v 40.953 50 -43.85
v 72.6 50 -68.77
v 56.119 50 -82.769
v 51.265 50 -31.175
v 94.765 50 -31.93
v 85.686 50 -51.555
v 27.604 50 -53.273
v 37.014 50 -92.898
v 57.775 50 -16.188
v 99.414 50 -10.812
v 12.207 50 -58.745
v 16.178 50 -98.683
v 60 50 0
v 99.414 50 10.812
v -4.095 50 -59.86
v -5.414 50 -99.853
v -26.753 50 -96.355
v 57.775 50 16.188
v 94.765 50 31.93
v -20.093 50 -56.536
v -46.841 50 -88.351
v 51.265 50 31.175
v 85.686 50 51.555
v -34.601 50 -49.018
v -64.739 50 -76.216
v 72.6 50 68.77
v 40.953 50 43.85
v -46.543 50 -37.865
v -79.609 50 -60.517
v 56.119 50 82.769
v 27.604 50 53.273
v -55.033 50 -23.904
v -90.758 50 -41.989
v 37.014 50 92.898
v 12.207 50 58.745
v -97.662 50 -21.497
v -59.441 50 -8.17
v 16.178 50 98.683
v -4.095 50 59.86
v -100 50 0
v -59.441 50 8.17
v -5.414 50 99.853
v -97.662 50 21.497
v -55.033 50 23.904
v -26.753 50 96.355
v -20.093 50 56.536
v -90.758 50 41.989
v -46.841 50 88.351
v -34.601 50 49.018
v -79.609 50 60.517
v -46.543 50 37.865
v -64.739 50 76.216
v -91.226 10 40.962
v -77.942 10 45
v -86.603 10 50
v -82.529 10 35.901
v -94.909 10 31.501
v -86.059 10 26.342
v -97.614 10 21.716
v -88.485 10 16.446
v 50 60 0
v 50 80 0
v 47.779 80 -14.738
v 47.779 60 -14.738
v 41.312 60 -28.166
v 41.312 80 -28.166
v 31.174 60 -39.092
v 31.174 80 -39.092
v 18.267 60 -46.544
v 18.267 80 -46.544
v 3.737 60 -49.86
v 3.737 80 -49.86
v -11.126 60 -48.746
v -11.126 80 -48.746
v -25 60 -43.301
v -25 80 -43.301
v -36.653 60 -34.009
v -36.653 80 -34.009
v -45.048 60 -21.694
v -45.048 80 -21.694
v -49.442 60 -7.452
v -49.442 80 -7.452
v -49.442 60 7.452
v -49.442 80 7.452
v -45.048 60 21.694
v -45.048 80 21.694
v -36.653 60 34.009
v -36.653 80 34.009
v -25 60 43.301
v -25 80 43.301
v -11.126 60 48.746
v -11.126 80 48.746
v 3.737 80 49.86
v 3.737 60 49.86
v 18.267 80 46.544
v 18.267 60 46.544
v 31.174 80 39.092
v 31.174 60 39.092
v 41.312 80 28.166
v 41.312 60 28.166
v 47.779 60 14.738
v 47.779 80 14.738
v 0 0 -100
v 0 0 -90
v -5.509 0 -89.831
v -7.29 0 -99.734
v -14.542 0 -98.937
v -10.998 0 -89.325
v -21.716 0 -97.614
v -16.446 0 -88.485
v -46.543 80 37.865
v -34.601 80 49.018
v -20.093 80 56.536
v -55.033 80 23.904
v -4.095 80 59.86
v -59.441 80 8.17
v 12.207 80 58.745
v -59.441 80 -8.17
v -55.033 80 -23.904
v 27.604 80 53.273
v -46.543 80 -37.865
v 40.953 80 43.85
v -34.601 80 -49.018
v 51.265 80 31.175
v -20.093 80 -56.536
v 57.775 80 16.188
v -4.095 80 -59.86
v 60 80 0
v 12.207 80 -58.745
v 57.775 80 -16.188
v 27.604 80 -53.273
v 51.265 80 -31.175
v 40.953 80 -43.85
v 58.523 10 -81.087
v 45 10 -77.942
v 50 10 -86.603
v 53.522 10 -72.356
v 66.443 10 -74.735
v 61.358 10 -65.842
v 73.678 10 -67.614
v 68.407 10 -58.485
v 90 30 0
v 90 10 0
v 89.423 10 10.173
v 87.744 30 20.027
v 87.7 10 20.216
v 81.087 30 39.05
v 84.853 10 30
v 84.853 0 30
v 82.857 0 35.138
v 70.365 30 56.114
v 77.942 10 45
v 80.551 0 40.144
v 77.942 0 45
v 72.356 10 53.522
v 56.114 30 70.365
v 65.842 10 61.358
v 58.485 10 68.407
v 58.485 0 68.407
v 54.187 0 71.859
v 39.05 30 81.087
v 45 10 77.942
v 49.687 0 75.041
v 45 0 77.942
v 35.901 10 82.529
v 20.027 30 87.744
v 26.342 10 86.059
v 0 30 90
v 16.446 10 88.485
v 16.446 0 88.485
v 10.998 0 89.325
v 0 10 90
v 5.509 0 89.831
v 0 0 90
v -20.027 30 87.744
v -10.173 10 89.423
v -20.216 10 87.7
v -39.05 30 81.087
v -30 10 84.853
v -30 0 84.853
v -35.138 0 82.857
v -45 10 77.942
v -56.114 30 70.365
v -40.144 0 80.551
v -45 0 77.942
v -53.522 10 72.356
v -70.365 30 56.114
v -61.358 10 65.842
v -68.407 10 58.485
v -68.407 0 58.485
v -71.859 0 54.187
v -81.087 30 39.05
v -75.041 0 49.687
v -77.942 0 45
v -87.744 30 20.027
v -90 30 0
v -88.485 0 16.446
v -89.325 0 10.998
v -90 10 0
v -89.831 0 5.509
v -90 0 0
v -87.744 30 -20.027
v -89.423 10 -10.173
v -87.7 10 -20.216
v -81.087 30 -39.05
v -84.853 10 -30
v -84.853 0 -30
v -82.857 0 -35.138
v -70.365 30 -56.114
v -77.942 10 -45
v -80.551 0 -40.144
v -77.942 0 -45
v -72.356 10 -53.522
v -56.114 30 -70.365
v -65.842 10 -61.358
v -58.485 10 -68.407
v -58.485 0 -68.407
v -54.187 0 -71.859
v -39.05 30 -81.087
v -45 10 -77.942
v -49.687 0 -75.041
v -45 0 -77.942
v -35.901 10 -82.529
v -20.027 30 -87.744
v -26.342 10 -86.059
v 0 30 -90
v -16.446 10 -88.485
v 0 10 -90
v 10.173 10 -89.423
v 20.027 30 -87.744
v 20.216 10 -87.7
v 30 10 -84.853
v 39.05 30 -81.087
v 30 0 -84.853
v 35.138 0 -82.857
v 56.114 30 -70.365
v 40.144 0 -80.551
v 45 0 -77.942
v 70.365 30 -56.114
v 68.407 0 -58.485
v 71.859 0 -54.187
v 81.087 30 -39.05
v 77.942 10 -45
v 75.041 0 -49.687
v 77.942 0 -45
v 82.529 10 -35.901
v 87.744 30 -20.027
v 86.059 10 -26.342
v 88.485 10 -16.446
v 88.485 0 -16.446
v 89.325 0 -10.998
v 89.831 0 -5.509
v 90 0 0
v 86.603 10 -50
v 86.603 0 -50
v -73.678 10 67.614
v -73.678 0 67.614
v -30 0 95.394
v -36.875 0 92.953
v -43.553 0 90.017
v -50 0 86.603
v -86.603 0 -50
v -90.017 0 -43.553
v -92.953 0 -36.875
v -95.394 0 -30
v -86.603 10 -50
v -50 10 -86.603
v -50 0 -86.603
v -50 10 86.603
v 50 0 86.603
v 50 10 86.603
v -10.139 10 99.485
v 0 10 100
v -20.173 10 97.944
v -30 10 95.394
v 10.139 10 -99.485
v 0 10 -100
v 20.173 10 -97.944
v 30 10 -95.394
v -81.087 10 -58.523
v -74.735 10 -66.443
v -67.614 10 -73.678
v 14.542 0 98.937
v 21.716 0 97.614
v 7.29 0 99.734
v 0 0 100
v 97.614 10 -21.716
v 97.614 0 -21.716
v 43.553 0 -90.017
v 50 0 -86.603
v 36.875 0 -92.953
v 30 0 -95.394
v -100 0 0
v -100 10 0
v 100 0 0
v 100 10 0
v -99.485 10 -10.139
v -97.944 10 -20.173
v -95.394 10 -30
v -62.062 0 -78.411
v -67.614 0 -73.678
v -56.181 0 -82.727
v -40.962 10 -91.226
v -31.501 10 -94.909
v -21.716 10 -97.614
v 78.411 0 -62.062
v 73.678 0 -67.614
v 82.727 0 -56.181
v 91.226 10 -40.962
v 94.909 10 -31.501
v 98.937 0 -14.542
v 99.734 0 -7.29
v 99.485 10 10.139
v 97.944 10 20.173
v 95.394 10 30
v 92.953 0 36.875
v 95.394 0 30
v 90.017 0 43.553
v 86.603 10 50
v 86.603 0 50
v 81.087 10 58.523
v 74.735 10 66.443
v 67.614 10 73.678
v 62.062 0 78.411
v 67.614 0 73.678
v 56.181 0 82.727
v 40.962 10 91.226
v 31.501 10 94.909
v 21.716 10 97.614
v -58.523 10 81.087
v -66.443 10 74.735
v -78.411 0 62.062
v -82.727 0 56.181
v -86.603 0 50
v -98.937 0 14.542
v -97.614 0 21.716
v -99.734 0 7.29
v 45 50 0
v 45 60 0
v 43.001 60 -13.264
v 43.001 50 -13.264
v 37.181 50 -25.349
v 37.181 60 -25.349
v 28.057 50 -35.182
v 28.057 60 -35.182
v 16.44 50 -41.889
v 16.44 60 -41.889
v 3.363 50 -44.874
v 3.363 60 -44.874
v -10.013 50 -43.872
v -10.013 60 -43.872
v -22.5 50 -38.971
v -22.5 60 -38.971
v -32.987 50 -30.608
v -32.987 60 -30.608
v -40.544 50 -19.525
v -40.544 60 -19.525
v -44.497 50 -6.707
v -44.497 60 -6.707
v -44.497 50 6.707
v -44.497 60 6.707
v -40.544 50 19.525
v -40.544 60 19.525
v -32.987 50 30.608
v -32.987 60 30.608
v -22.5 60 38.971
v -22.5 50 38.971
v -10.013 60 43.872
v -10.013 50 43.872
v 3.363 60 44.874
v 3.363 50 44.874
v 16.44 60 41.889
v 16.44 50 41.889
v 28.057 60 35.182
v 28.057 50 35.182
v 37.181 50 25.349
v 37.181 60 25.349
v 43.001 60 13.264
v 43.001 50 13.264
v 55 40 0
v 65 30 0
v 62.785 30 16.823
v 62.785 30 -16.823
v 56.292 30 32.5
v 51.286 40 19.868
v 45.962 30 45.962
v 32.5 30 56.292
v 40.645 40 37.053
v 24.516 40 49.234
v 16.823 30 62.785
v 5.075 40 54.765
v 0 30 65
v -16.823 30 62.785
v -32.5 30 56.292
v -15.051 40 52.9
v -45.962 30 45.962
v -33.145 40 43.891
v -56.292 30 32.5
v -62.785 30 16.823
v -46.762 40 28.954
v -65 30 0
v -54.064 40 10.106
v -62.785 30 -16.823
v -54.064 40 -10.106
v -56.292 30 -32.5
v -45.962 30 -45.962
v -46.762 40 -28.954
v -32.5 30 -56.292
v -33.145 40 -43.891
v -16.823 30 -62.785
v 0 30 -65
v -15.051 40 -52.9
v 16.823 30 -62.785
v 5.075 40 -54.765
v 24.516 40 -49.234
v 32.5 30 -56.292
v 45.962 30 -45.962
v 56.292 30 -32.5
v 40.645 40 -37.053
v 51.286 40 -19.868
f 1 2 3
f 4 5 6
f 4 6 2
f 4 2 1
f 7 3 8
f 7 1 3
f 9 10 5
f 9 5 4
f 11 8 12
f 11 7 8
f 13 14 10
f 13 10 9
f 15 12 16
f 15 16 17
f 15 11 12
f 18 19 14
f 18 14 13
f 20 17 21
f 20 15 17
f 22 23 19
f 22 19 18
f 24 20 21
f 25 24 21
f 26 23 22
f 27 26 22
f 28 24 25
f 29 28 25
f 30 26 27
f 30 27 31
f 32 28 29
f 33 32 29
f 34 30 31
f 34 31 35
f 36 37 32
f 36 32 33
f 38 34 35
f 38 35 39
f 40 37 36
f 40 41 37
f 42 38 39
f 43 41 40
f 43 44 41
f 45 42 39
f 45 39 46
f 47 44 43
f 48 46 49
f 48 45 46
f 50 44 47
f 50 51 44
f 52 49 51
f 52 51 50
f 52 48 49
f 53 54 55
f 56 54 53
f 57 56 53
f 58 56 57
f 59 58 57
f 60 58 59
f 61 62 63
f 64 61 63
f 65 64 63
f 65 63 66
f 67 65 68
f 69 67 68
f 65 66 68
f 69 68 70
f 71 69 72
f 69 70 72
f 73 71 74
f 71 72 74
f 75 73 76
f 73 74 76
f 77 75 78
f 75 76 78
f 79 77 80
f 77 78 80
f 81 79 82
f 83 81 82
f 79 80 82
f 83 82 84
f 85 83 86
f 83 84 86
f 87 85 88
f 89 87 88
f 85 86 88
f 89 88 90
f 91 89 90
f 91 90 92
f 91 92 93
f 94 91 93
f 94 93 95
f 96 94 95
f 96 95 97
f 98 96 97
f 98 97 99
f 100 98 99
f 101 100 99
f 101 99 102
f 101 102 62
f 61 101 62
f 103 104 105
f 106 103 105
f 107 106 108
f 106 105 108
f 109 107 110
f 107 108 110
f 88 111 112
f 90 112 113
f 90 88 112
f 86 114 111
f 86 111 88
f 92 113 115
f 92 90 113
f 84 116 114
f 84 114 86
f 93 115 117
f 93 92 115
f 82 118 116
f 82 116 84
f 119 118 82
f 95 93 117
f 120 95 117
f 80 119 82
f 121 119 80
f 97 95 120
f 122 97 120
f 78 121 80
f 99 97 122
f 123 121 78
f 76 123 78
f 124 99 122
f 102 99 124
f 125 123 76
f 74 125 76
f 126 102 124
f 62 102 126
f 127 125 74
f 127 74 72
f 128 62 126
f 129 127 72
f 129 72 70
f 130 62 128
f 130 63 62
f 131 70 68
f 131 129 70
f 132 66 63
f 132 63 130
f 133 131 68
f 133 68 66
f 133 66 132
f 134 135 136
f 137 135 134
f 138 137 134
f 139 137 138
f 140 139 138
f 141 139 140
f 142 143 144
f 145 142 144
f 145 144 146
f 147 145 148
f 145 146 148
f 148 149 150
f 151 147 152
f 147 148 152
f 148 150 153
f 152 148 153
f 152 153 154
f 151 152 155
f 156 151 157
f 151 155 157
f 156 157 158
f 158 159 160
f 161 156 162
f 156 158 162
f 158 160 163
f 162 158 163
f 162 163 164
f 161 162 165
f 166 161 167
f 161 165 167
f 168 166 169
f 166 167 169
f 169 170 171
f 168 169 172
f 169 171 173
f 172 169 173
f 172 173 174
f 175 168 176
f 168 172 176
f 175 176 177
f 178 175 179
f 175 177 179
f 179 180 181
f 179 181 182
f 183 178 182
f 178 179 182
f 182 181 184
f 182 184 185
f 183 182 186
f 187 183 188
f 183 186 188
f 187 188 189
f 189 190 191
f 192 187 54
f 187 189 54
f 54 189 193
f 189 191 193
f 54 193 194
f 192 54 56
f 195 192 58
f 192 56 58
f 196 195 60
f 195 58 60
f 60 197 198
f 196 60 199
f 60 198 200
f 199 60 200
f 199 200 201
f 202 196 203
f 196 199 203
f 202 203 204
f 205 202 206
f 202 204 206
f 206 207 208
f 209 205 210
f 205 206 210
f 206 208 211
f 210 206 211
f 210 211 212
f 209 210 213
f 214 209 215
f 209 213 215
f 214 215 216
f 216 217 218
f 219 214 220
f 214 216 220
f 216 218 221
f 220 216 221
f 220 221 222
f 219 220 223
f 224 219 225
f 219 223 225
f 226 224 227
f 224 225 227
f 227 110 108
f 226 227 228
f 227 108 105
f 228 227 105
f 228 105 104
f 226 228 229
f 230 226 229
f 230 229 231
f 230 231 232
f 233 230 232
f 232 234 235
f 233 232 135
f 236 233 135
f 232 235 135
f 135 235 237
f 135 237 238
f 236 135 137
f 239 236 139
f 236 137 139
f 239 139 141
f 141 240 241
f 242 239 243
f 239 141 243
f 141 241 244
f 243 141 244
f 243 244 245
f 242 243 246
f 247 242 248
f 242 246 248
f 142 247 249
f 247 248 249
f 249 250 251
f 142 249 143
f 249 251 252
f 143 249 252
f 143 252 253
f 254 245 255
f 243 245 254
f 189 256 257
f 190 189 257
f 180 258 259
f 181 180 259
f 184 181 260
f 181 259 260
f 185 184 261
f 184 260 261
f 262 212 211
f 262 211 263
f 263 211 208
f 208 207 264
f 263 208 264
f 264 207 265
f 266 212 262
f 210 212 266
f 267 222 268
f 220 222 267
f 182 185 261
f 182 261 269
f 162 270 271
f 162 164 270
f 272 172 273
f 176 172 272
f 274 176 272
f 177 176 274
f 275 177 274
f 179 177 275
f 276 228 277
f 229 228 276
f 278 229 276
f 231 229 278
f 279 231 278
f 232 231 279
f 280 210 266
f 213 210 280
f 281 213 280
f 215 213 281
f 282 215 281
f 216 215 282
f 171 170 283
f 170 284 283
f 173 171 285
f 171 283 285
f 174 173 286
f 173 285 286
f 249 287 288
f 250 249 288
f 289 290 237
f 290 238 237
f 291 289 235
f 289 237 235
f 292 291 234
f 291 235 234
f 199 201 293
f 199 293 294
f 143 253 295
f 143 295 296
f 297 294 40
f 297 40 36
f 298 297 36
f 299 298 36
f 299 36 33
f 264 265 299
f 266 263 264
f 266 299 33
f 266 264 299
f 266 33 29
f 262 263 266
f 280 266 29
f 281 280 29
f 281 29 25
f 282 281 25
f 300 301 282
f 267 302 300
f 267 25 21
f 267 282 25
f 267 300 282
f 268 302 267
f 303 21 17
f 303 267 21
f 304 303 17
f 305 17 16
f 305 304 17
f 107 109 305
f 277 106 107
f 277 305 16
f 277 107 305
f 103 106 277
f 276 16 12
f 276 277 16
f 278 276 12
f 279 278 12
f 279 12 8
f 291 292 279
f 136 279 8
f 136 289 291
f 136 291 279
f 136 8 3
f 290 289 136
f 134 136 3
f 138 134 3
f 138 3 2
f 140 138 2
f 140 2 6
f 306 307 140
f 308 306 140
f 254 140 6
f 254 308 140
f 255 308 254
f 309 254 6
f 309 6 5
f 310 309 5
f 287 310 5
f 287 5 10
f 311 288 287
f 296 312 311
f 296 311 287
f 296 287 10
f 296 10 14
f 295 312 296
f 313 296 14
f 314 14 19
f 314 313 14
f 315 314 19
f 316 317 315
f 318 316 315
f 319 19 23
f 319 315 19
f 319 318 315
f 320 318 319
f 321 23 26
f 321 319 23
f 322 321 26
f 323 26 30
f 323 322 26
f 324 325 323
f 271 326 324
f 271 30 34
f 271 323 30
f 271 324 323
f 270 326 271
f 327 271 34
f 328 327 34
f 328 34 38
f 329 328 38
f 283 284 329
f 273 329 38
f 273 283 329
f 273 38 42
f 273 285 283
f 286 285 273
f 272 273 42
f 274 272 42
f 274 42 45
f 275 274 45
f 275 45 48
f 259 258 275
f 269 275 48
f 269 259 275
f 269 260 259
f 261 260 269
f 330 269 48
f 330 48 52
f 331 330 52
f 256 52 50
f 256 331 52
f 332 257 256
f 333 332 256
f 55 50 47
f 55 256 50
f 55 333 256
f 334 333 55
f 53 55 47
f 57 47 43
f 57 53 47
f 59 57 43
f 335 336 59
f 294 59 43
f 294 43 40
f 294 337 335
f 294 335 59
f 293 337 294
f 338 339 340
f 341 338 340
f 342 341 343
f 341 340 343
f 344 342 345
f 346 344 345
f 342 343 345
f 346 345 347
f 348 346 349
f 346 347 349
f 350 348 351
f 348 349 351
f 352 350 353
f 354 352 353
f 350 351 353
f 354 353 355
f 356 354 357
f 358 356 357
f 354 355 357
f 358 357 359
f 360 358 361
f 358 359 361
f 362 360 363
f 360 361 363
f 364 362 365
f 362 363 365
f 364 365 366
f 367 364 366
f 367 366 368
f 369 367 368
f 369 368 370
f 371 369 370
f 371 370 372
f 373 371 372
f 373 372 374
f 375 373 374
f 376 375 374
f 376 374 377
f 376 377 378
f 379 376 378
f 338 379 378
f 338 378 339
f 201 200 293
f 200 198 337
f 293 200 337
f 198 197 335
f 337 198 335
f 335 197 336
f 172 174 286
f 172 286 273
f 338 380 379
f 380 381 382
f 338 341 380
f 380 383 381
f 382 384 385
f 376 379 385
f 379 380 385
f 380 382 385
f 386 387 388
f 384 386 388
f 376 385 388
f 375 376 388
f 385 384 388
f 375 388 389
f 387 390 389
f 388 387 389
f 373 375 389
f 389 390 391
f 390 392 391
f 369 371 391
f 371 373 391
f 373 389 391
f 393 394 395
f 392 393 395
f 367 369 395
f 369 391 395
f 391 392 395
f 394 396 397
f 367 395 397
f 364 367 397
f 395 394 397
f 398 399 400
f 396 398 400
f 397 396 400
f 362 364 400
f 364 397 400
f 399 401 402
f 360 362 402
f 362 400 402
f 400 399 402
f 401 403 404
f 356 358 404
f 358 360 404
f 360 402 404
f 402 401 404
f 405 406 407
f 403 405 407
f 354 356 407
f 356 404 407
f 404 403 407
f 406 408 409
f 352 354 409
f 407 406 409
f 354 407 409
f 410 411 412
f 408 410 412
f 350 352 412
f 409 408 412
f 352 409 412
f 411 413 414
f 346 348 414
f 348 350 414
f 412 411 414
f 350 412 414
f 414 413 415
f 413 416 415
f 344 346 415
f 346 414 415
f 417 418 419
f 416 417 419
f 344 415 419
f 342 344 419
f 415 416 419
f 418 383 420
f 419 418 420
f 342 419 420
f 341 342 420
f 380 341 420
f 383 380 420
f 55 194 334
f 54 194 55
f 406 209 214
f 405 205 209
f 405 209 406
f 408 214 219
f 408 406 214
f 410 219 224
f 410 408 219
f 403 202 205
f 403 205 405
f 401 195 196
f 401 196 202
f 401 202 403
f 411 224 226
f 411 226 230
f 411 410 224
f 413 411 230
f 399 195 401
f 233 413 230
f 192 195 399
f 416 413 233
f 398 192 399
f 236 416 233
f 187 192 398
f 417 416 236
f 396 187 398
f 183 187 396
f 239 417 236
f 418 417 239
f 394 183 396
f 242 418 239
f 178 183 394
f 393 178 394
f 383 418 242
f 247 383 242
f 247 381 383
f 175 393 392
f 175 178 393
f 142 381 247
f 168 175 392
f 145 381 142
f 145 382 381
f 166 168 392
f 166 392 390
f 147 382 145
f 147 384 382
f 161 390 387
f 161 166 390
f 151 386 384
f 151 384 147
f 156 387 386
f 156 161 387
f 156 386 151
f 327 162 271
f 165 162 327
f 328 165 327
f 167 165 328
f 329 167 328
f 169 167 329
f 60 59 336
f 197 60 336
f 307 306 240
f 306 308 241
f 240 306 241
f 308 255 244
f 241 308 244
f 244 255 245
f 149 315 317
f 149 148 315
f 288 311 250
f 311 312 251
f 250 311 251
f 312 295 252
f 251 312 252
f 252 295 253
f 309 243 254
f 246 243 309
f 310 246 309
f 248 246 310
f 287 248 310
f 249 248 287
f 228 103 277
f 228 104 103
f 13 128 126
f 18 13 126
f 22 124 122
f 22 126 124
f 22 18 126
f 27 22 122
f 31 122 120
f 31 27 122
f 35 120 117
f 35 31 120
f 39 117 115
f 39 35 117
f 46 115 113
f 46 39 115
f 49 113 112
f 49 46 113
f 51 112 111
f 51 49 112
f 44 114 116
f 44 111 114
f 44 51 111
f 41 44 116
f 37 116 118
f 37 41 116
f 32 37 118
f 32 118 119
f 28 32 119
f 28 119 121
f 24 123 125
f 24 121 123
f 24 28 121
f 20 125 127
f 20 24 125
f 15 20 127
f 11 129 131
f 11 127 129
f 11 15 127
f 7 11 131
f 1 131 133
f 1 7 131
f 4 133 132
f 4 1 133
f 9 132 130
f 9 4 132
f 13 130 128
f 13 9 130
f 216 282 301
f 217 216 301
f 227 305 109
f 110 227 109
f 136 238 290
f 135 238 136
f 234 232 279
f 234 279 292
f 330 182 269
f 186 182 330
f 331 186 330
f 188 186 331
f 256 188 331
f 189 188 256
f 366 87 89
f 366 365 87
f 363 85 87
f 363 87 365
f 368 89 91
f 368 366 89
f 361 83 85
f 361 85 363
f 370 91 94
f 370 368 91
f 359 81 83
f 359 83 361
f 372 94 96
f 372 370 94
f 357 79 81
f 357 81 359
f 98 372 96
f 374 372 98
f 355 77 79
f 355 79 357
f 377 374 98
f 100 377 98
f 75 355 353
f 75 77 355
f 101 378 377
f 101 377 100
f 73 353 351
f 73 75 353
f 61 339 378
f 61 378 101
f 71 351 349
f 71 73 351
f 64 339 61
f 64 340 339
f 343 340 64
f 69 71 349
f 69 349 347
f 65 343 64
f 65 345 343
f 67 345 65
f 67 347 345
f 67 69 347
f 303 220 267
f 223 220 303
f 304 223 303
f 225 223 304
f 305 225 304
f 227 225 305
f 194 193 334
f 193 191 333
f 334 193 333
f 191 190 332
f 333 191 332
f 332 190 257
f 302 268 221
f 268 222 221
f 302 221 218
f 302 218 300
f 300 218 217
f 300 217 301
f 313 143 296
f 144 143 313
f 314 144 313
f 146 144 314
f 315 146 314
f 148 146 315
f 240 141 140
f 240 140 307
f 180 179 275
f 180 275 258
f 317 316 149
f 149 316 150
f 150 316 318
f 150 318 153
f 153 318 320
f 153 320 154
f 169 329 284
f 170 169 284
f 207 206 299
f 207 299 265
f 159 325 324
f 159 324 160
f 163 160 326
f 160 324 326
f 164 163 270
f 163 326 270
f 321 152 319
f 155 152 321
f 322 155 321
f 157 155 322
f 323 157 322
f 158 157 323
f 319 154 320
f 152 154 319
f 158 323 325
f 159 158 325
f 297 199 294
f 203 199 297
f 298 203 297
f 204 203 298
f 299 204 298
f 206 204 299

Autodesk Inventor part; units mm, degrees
ref_plane "YZ Plane" through (0, 0, 0) normal (1, 0, 0) x (0, 1, 0)
ref_plane "XZ Plane" through (0, 0, 0) normal (0, 1, 0) x (-1, 0, 0)
ref_plane "XY Plane" through (0, 0, 0) normal (0, 0, 1) x (1, 0, 0)
sketch "Sketch1" plane through (0, 0, 0) normal (0, 1, 0) x (-1, 0, 0)
  circle A0 centre (0, 0) radius 100
  dimension "d0" = 200
extrude "Extrusion1" add sketch "Sketch1" along normal blind 50
sketch "Sketch2" plane through (0, 0, 0) normal (0, -1, 0) x (1, 0, 0)
  circle A0 centre (0, 0) radius 90
  dimension "d3" = 180
extrude "Extrusion2" cut sketch "Sketch2" against normal blind 30
sketch "Sketch3" plane through (0, 0, 0) normal (1, 0, 0) x (0, 1, 0)
  line L0 (0, 0) -> (10, 0)
  line L1 (10, 0) -> (10, -30)
  line L2 (10, -30) -> (0, -30)
  line L3 (0, -30) -> (0, 0)
  dimension "d6" = 10
  dimension "d7" = 30
extrude "Extrusion3" cut sketch "Sketch3" against normal blind 400
pattern_circular "Circular Pattern1" count 12 over 360 about axis through (0, -10, 0) along (0, 1, 0) of "Extrusion3"
sketch "Sketch4" plane through (0, 50, 0) normal (0, 1, 0) x (1, 0, 0)
  circle A0 centre (0, 0) radius 60
  dimension "d13" = 120
extrude "Extrusion4" add sketch "Sketch4" along normal blind 30
sketch "Sketch5" plane through (0, 80, 0) normal (0, 1, 0) x (1, 0, 0)
  circle A0 centre (0, 0) radius 50
  dimension "d16" = 100
extrude "Extrusion5" cut sketch "Sketch5" against normal blind 20
sketch "Sketch6" plane through (0, 60, 0) normal (0, 1, 0) x (1, 0, 0)
  circle A0 centre (0, 0) radius 45
  dimension "d19" = 90
extrude "Extrusion6" cut sketch "Sketch6" against normal blind 50
chamfer "Chamfer1" distance 20 angle 45 1 edges at (-45, 30, 0)
properties part number "Slo"
